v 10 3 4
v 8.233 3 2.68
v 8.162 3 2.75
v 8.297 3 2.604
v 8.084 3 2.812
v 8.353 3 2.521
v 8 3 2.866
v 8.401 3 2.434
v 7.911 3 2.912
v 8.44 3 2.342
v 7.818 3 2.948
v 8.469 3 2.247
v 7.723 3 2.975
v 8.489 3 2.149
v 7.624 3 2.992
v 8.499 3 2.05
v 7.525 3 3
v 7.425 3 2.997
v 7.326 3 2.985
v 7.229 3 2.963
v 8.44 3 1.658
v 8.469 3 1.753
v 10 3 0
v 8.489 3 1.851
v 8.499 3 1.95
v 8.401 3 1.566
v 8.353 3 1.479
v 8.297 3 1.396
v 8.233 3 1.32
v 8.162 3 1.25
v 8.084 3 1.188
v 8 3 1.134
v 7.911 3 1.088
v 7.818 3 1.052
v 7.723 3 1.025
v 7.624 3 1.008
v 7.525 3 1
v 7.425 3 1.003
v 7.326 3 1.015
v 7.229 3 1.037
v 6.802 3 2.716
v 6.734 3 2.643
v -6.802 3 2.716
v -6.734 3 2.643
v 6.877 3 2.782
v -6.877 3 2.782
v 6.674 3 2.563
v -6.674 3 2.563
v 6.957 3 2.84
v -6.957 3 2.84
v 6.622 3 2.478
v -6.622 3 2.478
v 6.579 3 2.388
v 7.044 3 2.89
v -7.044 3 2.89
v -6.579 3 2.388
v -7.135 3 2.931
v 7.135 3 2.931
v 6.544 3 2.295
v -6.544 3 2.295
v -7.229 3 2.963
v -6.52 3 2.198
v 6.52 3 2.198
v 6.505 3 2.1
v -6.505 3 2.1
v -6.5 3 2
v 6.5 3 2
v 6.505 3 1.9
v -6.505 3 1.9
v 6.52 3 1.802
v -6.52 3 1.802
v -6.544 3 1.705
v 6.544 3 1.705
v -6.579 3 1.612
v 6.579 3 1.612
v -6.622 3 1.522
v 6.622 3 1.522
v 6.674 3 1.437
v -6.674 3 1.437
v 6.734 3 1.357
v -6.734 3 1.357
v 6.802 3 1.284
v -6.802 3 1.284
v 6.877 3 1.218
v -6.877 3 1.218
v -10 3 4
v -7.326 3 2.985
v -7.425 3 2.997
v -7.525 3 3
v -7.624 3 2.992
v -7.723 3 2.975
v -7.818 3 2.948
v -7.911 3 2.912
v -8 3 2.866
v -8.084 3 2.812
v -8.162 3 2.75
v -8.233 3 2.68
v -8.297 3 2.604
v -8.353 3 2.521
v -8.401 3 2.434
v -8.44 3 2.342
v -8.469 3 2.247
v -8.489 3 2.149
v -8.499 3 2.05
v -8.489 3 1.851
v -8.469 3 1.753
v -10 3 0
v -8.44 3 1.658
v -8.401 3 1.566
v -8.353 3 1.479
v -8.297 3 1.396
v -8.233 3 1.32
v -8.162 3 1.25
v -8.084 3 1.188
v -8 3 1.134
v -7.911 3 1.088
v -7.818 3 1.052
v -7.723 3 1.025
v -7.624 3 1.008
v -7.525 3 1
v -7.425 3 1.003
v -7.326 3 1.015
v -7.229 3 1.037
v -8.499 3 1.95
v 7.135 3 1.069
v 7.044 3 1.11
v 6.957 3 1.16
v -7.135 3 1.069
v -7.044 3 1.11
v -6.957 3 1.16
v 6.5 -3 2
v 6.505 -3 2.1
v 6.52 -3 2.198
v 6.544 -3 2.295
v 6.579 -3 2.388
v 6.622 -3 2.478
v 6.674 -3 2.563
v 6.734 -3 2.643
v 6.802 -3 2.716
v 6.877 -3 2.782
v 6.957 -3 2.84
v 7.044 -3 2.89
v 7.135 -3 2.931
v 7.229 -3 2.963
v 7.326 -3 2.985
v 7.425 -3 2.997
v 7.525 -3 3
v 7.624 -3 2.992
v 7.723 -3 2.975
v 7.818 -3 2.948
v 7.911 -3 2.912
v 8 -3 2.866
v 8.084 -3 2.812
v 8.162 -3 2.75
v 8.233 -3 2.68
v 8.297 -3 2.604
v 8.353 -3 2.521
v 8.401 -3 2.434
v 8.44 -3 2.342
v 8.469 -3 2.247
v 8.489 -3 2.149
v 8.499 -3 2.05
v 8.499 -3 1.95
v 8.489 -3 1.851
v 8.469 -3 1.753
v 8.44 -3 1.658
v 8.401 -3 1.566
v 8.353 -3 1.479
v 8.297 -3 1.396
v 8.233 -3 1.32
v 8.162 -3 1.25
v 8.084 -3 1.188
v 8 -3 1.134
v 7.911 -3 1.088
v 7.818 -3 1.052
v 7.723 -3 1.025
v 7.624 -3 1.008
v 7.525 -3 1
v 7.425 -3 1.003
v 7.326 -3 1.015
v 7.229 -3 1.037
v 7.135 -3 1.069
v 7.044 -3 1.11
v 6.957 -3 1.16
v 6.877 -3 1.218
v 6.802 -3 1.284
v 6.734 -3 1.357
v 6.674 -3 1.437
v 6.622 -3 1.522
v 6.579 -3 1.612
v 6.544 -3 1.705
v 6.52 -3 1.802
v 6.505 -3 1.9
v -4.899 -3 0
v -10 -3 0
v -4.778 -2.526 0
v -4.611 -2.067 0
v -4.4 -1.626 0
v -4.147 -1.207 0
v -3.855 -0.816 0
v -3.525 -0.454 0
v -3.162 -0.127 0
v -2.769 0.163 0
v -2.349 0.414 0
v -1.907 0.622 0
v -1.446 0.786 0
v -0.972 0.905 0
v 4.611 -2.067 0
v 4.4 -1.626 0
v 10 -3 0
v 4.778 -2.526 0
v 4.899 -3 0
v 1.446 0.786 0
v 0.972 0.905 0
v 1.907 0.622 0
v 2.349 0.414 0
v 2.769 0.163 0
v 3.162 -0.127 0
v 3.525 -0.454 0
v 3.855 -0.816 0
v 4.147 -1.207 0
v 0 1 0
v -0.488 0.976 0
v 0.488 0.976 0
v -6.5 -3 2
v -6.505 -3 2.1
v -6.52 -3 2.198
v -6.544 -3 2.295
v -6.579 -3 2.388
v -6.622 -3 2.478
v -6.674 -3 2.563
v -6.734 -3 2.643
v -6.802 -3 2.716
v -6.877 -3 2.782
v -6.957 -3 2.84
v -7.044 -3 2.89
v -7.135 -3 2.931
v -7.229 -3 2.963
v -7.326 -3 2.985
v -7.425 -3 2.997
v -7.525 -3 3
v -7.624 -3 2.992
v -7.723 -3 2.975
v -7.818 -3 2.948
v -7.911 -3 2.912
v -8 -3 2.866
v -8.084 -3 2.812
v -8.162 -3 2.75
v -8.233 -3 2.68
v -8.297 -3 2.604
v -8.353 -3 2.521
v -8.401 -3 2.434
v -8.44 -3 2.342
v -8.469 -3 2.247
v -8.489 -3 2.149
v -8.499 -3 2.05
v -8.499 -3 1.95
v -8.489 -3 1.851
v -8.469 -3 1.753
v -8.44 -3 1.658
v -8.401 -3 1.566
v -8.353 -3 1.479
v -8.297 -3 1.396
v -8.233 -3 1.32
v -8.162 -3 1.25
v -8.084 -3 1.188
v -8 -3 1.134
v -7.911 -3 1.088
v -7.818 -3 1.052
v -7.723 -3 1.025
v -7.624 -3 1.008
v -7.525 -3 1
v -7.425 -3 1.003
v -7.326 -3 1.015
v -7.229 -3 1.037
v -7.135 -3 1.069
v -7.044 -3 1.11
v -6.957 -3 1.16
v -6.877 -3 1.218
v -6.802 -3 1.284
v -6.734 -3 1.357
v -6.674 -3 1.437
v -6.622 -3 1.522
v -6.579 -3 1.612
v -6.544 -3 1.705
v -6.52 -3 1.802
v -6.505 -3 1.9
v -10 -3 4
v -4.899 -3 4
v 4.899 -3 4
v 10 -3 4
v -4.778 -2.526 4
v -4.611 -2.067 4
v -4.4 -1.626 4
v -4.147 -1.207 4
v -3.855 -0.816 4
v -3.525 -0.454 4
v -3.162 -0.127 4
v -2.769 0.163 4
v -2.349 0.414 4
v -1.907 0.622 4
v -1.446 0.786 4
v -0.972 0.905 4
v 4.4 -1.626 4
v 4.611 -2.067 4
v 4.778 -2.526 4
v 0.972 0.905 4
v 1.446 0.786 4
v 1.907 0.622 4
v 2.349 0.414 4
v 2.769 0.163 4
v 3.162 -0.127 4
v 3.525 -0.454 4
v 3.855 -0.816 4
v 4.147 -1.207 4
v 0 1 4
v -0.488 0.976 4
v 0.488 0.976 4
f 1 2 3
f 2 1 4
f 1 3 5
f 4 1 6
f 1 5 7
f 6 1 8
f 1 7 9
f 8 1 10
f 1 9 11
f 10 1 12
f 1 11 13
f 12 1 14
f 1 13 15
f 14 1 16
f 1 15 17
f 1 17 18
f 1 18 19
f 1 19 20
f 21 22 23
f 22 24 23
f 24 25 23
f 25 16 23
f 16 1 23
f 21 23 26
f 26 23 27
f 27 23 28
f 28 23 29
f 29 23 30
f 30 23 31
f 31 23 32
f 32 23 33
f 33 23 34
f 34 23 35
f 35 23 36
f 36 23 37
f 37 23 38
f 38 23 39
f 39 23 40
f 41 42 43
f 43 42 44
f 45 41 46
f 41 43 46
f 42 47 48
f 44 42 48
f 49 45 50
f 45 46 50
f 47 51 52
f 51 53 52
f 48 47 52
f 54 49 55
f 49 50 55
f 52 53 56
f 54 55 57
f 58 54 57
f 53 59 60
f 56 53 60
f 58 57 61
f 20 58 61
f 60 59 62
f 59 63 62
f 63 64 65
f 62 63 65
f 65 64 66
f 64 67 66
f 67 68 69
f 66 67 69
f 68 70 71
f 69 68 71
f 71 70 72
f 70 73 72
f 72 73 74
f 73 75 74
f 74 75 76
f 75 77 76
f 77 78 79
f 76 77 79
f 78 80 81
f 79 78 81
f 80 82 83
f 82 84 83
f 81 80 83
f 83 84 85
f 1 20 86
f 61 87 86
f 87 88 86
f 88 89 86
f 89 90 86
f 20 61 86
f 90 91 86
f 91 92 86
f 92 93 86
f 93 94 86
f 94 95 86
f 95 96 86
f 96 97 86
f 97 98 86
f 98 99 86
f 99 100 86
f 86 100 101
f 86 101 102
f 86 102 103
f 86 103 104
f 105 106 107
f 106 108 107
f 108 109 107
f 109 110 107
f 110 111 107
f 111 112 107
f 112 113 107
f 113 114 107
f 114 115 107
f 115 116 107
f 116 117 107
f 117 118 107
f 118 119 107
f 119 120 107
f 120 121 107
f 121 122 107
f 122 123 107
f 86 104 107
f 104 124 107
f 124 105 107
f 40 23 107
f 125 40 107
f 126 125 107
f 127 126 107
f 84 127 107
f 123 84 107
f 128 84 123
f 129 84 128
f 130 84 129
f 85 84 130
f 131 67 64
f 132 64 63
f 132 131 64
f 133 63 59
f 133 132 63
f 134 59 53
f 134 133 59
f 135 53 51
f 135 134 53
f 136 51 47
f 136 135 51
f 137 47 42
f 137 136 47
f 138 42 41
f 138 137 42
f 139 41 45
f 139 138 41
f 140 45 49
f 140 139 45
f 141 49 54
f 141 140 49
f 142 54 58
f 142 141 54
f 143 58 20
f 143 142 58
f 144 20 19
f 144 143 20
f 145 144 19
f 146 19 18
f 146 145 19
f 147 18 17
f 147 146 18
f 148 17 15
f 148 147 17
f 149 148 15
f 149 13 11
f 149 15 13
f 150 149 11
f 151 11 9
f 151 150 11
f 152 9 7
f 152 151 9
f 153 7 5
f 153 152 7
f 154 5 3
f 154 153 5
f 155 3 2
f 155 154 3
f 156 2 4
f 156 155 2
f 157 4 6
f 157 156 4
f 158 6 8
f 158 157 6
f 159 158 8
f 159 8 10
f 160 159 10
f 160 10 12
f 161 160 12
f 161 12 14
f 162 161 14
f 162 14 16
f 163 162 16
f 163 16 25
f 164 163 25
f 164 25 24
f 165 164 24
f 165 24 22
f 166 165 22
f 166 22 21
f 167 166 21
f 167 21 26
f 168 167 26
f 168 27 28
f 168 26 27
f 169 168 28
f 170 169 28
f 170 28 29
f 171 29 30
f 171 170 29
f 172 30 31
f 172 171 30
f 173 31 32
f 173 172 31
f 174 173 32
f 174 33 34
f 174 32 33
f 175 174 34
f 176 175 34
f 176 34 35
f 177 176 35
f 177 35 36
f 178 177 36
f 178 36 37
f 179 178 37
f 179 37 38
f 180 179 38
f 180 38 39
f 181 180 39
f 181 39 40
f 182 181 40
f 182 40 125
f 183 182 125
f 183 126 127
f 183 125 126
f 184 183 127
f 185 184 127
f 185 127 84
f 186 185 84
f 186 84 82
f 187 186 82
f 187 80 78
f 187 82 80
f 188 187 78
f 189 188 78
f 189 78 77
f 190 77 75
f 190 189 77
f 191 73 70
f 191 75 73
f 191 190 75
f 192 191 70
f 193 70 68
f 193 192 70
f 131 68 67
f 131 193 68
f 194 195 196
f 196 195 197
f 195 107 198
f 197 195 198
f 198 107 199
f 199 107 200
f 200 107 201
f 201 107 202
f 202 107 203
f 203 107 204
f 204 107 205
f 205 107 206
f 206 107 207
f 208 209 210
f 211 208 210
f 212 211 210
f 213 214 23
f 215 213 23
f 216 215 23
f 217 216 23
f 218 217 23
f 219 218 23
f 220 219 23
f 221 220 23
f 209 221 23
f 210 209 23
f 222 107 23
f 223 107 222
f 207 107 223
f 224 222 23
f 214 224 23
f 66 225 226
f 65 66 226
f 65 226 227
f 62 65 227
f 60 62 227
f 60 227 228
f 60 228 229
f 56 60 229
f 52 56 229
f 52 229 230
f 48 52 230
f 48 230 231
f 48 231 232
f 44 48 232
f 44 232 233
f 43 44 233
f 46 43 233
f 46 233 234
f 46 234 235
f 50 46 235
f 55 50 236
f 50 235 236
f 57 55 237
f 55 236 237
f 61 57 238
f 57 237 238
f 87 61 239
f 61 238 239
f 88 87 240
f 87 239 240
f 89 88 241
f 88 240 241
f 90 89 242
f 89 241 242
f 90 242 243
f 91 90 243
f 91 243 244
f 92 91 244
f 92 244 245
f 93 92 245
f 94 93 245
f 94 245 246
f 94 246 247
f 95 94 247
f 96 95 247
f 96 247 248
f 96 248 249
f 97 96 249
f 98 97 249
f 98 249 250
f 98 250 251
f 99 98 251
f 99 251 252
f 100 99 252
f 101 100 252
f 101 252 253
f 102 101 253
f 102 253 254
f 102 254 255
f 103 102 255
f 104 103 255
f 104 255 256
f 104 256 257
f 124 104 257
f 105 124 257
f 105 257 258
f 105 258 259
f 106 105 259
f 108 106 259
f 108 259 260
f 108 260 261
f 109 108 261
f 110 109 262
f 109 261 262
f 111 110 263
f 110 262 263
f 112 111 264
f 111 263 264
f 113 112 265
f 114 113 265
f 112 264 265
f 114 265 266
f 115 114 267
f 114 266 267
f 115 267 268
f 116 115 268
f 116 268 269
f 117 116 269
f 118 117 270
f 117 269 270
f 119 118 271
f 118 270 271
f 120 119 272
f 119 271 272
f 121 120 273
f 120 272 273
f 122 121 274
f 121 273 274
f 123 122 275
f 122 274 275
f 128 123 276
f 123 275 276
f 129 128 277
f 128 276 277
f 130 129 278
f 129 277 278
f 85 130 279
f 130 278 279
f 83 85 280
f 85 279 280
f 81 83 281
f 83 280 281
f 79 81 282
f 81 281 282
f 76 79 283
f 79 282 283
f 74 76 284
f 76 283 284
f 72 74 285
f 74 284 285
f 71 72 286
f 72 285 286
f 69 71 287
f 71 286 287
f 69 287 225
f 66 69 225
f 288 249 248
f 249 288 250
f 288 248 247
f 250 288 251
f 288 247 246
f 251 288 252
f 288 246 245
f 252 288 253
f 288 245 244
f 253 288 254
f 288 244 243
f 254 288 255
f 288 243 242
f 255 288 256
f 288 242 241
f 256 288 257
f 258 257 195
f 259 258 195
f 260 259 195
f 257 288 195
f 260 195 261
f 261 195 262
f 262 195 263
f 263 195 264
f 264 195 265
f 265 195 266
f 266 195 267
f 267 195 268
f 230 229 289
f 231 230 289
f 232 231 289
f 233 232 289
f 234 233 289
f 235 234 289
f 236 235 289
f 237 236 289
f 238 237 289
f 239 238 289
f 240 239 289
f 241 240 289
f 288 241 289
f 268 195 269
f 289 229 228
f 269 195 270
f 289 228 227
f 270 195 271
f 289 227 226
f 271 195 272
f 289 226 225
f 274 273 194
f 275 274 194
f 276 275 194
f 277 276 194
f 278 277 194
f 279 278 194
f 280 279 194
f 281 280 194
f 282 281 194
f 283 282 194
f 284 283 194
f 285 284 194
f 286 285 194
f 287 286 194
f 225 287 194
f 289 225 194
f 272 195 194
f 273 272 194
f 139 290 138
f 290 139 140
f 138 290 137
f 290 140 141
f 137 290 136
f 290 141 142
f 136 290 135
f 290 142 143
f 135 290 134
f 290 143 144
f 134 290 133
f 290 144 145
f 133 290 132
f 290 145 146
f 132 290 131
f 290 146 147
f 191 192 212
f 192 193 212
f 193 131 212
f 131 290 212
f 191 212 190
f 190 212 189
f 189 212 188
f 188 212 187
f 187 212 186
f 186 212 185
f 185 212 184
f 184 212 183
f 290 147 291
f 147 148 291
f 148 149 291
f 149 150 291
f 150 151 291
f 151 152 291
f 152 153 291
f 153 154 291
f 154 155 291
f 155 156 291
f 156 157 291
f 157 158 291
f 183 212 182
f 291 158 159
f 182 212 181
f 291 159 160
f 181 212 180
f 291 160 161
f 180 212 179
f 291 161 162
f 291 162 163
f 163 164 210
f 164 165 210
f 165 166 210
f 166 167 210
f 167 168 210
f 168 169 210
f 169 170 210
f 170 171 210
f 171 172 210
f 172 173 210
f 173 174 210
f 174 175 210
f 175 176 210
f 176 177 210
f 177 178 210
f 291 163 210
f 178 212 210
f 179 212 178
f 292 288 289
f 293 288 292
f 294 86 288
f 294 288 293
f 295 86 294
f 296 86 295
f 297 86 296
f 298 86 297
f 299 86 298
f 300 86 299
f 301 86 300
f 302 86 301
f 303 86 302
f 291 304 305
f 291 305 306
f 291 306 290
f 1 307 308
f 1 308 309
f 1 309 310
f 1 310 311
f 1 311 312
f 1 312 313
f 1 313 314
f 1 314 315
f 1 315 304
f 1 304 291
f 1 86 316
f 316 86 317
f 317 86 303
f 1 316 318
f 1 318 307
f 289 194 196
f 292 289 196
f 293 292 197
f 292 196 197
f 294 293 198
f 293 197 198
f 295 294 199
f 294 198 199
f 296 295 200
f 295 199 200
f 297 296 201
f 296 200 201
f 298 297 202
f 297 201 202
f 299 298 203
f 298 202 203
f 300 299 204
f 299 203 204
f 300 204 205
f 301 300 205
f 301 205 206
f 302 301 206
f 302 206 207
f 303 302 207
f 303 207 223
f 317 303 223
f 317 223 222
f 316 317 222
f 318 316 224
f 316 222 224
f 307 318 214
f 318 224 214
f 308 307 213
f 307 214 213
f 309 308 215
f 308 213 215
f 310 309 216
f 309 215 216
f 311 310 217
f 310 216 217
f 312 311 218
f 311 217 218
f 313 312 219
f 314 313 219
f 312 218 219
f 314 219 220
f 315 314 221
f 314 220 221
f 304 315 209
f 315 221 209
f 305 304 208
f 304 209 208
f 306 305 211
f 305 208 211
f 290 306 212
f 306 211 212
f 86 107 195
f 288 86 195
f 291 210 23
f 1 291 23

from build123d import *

# Parameters (mm, degrees)
EXTRUDE1_DEPTH = 4
SKETCH2_R      = 1
EXTRUDE2_DEPTH = 7


with BuildPart() as part:
    # Sketch1 → Extrude1 (new body)
    with BuildSketch(Plane.XY):
        with BuildLine():
            Line((4.898979486, -3), (10, -3))
            Line((10, -3), (10, 3))
            Line((10, 3), (-10, 3))
            Line((-10, 3), (-10, -3))
            Line((-10, -3), (-4.898979486, -3))
            ThreePointArc((-4.898979486, -3), (0, 1), (4.898979486, -3))
        make_face()
    extrude(amount=EXTRUDE1_DEPTH)

    # Sketch2 → Extrude2 (cut, through all)
    with BuildSketch(Plane.XZ.offset(3)):
        with Locations((-7.5, 2)):
            Circle(SKETCH2_R)
    extrude2 = extrude(amount=-EXTRUDE2_DEPTH, mode=Mode.SUBTRACT)

    # Mirror1: Extrude2 across plane
    add(extrude2.mirror(Plane(origin=(0, 0, 0), x_dir=(0, 0, 1), z_dir=(1, 0, 0))), mode=Mode.SUBTRACT)


solid = part.part
